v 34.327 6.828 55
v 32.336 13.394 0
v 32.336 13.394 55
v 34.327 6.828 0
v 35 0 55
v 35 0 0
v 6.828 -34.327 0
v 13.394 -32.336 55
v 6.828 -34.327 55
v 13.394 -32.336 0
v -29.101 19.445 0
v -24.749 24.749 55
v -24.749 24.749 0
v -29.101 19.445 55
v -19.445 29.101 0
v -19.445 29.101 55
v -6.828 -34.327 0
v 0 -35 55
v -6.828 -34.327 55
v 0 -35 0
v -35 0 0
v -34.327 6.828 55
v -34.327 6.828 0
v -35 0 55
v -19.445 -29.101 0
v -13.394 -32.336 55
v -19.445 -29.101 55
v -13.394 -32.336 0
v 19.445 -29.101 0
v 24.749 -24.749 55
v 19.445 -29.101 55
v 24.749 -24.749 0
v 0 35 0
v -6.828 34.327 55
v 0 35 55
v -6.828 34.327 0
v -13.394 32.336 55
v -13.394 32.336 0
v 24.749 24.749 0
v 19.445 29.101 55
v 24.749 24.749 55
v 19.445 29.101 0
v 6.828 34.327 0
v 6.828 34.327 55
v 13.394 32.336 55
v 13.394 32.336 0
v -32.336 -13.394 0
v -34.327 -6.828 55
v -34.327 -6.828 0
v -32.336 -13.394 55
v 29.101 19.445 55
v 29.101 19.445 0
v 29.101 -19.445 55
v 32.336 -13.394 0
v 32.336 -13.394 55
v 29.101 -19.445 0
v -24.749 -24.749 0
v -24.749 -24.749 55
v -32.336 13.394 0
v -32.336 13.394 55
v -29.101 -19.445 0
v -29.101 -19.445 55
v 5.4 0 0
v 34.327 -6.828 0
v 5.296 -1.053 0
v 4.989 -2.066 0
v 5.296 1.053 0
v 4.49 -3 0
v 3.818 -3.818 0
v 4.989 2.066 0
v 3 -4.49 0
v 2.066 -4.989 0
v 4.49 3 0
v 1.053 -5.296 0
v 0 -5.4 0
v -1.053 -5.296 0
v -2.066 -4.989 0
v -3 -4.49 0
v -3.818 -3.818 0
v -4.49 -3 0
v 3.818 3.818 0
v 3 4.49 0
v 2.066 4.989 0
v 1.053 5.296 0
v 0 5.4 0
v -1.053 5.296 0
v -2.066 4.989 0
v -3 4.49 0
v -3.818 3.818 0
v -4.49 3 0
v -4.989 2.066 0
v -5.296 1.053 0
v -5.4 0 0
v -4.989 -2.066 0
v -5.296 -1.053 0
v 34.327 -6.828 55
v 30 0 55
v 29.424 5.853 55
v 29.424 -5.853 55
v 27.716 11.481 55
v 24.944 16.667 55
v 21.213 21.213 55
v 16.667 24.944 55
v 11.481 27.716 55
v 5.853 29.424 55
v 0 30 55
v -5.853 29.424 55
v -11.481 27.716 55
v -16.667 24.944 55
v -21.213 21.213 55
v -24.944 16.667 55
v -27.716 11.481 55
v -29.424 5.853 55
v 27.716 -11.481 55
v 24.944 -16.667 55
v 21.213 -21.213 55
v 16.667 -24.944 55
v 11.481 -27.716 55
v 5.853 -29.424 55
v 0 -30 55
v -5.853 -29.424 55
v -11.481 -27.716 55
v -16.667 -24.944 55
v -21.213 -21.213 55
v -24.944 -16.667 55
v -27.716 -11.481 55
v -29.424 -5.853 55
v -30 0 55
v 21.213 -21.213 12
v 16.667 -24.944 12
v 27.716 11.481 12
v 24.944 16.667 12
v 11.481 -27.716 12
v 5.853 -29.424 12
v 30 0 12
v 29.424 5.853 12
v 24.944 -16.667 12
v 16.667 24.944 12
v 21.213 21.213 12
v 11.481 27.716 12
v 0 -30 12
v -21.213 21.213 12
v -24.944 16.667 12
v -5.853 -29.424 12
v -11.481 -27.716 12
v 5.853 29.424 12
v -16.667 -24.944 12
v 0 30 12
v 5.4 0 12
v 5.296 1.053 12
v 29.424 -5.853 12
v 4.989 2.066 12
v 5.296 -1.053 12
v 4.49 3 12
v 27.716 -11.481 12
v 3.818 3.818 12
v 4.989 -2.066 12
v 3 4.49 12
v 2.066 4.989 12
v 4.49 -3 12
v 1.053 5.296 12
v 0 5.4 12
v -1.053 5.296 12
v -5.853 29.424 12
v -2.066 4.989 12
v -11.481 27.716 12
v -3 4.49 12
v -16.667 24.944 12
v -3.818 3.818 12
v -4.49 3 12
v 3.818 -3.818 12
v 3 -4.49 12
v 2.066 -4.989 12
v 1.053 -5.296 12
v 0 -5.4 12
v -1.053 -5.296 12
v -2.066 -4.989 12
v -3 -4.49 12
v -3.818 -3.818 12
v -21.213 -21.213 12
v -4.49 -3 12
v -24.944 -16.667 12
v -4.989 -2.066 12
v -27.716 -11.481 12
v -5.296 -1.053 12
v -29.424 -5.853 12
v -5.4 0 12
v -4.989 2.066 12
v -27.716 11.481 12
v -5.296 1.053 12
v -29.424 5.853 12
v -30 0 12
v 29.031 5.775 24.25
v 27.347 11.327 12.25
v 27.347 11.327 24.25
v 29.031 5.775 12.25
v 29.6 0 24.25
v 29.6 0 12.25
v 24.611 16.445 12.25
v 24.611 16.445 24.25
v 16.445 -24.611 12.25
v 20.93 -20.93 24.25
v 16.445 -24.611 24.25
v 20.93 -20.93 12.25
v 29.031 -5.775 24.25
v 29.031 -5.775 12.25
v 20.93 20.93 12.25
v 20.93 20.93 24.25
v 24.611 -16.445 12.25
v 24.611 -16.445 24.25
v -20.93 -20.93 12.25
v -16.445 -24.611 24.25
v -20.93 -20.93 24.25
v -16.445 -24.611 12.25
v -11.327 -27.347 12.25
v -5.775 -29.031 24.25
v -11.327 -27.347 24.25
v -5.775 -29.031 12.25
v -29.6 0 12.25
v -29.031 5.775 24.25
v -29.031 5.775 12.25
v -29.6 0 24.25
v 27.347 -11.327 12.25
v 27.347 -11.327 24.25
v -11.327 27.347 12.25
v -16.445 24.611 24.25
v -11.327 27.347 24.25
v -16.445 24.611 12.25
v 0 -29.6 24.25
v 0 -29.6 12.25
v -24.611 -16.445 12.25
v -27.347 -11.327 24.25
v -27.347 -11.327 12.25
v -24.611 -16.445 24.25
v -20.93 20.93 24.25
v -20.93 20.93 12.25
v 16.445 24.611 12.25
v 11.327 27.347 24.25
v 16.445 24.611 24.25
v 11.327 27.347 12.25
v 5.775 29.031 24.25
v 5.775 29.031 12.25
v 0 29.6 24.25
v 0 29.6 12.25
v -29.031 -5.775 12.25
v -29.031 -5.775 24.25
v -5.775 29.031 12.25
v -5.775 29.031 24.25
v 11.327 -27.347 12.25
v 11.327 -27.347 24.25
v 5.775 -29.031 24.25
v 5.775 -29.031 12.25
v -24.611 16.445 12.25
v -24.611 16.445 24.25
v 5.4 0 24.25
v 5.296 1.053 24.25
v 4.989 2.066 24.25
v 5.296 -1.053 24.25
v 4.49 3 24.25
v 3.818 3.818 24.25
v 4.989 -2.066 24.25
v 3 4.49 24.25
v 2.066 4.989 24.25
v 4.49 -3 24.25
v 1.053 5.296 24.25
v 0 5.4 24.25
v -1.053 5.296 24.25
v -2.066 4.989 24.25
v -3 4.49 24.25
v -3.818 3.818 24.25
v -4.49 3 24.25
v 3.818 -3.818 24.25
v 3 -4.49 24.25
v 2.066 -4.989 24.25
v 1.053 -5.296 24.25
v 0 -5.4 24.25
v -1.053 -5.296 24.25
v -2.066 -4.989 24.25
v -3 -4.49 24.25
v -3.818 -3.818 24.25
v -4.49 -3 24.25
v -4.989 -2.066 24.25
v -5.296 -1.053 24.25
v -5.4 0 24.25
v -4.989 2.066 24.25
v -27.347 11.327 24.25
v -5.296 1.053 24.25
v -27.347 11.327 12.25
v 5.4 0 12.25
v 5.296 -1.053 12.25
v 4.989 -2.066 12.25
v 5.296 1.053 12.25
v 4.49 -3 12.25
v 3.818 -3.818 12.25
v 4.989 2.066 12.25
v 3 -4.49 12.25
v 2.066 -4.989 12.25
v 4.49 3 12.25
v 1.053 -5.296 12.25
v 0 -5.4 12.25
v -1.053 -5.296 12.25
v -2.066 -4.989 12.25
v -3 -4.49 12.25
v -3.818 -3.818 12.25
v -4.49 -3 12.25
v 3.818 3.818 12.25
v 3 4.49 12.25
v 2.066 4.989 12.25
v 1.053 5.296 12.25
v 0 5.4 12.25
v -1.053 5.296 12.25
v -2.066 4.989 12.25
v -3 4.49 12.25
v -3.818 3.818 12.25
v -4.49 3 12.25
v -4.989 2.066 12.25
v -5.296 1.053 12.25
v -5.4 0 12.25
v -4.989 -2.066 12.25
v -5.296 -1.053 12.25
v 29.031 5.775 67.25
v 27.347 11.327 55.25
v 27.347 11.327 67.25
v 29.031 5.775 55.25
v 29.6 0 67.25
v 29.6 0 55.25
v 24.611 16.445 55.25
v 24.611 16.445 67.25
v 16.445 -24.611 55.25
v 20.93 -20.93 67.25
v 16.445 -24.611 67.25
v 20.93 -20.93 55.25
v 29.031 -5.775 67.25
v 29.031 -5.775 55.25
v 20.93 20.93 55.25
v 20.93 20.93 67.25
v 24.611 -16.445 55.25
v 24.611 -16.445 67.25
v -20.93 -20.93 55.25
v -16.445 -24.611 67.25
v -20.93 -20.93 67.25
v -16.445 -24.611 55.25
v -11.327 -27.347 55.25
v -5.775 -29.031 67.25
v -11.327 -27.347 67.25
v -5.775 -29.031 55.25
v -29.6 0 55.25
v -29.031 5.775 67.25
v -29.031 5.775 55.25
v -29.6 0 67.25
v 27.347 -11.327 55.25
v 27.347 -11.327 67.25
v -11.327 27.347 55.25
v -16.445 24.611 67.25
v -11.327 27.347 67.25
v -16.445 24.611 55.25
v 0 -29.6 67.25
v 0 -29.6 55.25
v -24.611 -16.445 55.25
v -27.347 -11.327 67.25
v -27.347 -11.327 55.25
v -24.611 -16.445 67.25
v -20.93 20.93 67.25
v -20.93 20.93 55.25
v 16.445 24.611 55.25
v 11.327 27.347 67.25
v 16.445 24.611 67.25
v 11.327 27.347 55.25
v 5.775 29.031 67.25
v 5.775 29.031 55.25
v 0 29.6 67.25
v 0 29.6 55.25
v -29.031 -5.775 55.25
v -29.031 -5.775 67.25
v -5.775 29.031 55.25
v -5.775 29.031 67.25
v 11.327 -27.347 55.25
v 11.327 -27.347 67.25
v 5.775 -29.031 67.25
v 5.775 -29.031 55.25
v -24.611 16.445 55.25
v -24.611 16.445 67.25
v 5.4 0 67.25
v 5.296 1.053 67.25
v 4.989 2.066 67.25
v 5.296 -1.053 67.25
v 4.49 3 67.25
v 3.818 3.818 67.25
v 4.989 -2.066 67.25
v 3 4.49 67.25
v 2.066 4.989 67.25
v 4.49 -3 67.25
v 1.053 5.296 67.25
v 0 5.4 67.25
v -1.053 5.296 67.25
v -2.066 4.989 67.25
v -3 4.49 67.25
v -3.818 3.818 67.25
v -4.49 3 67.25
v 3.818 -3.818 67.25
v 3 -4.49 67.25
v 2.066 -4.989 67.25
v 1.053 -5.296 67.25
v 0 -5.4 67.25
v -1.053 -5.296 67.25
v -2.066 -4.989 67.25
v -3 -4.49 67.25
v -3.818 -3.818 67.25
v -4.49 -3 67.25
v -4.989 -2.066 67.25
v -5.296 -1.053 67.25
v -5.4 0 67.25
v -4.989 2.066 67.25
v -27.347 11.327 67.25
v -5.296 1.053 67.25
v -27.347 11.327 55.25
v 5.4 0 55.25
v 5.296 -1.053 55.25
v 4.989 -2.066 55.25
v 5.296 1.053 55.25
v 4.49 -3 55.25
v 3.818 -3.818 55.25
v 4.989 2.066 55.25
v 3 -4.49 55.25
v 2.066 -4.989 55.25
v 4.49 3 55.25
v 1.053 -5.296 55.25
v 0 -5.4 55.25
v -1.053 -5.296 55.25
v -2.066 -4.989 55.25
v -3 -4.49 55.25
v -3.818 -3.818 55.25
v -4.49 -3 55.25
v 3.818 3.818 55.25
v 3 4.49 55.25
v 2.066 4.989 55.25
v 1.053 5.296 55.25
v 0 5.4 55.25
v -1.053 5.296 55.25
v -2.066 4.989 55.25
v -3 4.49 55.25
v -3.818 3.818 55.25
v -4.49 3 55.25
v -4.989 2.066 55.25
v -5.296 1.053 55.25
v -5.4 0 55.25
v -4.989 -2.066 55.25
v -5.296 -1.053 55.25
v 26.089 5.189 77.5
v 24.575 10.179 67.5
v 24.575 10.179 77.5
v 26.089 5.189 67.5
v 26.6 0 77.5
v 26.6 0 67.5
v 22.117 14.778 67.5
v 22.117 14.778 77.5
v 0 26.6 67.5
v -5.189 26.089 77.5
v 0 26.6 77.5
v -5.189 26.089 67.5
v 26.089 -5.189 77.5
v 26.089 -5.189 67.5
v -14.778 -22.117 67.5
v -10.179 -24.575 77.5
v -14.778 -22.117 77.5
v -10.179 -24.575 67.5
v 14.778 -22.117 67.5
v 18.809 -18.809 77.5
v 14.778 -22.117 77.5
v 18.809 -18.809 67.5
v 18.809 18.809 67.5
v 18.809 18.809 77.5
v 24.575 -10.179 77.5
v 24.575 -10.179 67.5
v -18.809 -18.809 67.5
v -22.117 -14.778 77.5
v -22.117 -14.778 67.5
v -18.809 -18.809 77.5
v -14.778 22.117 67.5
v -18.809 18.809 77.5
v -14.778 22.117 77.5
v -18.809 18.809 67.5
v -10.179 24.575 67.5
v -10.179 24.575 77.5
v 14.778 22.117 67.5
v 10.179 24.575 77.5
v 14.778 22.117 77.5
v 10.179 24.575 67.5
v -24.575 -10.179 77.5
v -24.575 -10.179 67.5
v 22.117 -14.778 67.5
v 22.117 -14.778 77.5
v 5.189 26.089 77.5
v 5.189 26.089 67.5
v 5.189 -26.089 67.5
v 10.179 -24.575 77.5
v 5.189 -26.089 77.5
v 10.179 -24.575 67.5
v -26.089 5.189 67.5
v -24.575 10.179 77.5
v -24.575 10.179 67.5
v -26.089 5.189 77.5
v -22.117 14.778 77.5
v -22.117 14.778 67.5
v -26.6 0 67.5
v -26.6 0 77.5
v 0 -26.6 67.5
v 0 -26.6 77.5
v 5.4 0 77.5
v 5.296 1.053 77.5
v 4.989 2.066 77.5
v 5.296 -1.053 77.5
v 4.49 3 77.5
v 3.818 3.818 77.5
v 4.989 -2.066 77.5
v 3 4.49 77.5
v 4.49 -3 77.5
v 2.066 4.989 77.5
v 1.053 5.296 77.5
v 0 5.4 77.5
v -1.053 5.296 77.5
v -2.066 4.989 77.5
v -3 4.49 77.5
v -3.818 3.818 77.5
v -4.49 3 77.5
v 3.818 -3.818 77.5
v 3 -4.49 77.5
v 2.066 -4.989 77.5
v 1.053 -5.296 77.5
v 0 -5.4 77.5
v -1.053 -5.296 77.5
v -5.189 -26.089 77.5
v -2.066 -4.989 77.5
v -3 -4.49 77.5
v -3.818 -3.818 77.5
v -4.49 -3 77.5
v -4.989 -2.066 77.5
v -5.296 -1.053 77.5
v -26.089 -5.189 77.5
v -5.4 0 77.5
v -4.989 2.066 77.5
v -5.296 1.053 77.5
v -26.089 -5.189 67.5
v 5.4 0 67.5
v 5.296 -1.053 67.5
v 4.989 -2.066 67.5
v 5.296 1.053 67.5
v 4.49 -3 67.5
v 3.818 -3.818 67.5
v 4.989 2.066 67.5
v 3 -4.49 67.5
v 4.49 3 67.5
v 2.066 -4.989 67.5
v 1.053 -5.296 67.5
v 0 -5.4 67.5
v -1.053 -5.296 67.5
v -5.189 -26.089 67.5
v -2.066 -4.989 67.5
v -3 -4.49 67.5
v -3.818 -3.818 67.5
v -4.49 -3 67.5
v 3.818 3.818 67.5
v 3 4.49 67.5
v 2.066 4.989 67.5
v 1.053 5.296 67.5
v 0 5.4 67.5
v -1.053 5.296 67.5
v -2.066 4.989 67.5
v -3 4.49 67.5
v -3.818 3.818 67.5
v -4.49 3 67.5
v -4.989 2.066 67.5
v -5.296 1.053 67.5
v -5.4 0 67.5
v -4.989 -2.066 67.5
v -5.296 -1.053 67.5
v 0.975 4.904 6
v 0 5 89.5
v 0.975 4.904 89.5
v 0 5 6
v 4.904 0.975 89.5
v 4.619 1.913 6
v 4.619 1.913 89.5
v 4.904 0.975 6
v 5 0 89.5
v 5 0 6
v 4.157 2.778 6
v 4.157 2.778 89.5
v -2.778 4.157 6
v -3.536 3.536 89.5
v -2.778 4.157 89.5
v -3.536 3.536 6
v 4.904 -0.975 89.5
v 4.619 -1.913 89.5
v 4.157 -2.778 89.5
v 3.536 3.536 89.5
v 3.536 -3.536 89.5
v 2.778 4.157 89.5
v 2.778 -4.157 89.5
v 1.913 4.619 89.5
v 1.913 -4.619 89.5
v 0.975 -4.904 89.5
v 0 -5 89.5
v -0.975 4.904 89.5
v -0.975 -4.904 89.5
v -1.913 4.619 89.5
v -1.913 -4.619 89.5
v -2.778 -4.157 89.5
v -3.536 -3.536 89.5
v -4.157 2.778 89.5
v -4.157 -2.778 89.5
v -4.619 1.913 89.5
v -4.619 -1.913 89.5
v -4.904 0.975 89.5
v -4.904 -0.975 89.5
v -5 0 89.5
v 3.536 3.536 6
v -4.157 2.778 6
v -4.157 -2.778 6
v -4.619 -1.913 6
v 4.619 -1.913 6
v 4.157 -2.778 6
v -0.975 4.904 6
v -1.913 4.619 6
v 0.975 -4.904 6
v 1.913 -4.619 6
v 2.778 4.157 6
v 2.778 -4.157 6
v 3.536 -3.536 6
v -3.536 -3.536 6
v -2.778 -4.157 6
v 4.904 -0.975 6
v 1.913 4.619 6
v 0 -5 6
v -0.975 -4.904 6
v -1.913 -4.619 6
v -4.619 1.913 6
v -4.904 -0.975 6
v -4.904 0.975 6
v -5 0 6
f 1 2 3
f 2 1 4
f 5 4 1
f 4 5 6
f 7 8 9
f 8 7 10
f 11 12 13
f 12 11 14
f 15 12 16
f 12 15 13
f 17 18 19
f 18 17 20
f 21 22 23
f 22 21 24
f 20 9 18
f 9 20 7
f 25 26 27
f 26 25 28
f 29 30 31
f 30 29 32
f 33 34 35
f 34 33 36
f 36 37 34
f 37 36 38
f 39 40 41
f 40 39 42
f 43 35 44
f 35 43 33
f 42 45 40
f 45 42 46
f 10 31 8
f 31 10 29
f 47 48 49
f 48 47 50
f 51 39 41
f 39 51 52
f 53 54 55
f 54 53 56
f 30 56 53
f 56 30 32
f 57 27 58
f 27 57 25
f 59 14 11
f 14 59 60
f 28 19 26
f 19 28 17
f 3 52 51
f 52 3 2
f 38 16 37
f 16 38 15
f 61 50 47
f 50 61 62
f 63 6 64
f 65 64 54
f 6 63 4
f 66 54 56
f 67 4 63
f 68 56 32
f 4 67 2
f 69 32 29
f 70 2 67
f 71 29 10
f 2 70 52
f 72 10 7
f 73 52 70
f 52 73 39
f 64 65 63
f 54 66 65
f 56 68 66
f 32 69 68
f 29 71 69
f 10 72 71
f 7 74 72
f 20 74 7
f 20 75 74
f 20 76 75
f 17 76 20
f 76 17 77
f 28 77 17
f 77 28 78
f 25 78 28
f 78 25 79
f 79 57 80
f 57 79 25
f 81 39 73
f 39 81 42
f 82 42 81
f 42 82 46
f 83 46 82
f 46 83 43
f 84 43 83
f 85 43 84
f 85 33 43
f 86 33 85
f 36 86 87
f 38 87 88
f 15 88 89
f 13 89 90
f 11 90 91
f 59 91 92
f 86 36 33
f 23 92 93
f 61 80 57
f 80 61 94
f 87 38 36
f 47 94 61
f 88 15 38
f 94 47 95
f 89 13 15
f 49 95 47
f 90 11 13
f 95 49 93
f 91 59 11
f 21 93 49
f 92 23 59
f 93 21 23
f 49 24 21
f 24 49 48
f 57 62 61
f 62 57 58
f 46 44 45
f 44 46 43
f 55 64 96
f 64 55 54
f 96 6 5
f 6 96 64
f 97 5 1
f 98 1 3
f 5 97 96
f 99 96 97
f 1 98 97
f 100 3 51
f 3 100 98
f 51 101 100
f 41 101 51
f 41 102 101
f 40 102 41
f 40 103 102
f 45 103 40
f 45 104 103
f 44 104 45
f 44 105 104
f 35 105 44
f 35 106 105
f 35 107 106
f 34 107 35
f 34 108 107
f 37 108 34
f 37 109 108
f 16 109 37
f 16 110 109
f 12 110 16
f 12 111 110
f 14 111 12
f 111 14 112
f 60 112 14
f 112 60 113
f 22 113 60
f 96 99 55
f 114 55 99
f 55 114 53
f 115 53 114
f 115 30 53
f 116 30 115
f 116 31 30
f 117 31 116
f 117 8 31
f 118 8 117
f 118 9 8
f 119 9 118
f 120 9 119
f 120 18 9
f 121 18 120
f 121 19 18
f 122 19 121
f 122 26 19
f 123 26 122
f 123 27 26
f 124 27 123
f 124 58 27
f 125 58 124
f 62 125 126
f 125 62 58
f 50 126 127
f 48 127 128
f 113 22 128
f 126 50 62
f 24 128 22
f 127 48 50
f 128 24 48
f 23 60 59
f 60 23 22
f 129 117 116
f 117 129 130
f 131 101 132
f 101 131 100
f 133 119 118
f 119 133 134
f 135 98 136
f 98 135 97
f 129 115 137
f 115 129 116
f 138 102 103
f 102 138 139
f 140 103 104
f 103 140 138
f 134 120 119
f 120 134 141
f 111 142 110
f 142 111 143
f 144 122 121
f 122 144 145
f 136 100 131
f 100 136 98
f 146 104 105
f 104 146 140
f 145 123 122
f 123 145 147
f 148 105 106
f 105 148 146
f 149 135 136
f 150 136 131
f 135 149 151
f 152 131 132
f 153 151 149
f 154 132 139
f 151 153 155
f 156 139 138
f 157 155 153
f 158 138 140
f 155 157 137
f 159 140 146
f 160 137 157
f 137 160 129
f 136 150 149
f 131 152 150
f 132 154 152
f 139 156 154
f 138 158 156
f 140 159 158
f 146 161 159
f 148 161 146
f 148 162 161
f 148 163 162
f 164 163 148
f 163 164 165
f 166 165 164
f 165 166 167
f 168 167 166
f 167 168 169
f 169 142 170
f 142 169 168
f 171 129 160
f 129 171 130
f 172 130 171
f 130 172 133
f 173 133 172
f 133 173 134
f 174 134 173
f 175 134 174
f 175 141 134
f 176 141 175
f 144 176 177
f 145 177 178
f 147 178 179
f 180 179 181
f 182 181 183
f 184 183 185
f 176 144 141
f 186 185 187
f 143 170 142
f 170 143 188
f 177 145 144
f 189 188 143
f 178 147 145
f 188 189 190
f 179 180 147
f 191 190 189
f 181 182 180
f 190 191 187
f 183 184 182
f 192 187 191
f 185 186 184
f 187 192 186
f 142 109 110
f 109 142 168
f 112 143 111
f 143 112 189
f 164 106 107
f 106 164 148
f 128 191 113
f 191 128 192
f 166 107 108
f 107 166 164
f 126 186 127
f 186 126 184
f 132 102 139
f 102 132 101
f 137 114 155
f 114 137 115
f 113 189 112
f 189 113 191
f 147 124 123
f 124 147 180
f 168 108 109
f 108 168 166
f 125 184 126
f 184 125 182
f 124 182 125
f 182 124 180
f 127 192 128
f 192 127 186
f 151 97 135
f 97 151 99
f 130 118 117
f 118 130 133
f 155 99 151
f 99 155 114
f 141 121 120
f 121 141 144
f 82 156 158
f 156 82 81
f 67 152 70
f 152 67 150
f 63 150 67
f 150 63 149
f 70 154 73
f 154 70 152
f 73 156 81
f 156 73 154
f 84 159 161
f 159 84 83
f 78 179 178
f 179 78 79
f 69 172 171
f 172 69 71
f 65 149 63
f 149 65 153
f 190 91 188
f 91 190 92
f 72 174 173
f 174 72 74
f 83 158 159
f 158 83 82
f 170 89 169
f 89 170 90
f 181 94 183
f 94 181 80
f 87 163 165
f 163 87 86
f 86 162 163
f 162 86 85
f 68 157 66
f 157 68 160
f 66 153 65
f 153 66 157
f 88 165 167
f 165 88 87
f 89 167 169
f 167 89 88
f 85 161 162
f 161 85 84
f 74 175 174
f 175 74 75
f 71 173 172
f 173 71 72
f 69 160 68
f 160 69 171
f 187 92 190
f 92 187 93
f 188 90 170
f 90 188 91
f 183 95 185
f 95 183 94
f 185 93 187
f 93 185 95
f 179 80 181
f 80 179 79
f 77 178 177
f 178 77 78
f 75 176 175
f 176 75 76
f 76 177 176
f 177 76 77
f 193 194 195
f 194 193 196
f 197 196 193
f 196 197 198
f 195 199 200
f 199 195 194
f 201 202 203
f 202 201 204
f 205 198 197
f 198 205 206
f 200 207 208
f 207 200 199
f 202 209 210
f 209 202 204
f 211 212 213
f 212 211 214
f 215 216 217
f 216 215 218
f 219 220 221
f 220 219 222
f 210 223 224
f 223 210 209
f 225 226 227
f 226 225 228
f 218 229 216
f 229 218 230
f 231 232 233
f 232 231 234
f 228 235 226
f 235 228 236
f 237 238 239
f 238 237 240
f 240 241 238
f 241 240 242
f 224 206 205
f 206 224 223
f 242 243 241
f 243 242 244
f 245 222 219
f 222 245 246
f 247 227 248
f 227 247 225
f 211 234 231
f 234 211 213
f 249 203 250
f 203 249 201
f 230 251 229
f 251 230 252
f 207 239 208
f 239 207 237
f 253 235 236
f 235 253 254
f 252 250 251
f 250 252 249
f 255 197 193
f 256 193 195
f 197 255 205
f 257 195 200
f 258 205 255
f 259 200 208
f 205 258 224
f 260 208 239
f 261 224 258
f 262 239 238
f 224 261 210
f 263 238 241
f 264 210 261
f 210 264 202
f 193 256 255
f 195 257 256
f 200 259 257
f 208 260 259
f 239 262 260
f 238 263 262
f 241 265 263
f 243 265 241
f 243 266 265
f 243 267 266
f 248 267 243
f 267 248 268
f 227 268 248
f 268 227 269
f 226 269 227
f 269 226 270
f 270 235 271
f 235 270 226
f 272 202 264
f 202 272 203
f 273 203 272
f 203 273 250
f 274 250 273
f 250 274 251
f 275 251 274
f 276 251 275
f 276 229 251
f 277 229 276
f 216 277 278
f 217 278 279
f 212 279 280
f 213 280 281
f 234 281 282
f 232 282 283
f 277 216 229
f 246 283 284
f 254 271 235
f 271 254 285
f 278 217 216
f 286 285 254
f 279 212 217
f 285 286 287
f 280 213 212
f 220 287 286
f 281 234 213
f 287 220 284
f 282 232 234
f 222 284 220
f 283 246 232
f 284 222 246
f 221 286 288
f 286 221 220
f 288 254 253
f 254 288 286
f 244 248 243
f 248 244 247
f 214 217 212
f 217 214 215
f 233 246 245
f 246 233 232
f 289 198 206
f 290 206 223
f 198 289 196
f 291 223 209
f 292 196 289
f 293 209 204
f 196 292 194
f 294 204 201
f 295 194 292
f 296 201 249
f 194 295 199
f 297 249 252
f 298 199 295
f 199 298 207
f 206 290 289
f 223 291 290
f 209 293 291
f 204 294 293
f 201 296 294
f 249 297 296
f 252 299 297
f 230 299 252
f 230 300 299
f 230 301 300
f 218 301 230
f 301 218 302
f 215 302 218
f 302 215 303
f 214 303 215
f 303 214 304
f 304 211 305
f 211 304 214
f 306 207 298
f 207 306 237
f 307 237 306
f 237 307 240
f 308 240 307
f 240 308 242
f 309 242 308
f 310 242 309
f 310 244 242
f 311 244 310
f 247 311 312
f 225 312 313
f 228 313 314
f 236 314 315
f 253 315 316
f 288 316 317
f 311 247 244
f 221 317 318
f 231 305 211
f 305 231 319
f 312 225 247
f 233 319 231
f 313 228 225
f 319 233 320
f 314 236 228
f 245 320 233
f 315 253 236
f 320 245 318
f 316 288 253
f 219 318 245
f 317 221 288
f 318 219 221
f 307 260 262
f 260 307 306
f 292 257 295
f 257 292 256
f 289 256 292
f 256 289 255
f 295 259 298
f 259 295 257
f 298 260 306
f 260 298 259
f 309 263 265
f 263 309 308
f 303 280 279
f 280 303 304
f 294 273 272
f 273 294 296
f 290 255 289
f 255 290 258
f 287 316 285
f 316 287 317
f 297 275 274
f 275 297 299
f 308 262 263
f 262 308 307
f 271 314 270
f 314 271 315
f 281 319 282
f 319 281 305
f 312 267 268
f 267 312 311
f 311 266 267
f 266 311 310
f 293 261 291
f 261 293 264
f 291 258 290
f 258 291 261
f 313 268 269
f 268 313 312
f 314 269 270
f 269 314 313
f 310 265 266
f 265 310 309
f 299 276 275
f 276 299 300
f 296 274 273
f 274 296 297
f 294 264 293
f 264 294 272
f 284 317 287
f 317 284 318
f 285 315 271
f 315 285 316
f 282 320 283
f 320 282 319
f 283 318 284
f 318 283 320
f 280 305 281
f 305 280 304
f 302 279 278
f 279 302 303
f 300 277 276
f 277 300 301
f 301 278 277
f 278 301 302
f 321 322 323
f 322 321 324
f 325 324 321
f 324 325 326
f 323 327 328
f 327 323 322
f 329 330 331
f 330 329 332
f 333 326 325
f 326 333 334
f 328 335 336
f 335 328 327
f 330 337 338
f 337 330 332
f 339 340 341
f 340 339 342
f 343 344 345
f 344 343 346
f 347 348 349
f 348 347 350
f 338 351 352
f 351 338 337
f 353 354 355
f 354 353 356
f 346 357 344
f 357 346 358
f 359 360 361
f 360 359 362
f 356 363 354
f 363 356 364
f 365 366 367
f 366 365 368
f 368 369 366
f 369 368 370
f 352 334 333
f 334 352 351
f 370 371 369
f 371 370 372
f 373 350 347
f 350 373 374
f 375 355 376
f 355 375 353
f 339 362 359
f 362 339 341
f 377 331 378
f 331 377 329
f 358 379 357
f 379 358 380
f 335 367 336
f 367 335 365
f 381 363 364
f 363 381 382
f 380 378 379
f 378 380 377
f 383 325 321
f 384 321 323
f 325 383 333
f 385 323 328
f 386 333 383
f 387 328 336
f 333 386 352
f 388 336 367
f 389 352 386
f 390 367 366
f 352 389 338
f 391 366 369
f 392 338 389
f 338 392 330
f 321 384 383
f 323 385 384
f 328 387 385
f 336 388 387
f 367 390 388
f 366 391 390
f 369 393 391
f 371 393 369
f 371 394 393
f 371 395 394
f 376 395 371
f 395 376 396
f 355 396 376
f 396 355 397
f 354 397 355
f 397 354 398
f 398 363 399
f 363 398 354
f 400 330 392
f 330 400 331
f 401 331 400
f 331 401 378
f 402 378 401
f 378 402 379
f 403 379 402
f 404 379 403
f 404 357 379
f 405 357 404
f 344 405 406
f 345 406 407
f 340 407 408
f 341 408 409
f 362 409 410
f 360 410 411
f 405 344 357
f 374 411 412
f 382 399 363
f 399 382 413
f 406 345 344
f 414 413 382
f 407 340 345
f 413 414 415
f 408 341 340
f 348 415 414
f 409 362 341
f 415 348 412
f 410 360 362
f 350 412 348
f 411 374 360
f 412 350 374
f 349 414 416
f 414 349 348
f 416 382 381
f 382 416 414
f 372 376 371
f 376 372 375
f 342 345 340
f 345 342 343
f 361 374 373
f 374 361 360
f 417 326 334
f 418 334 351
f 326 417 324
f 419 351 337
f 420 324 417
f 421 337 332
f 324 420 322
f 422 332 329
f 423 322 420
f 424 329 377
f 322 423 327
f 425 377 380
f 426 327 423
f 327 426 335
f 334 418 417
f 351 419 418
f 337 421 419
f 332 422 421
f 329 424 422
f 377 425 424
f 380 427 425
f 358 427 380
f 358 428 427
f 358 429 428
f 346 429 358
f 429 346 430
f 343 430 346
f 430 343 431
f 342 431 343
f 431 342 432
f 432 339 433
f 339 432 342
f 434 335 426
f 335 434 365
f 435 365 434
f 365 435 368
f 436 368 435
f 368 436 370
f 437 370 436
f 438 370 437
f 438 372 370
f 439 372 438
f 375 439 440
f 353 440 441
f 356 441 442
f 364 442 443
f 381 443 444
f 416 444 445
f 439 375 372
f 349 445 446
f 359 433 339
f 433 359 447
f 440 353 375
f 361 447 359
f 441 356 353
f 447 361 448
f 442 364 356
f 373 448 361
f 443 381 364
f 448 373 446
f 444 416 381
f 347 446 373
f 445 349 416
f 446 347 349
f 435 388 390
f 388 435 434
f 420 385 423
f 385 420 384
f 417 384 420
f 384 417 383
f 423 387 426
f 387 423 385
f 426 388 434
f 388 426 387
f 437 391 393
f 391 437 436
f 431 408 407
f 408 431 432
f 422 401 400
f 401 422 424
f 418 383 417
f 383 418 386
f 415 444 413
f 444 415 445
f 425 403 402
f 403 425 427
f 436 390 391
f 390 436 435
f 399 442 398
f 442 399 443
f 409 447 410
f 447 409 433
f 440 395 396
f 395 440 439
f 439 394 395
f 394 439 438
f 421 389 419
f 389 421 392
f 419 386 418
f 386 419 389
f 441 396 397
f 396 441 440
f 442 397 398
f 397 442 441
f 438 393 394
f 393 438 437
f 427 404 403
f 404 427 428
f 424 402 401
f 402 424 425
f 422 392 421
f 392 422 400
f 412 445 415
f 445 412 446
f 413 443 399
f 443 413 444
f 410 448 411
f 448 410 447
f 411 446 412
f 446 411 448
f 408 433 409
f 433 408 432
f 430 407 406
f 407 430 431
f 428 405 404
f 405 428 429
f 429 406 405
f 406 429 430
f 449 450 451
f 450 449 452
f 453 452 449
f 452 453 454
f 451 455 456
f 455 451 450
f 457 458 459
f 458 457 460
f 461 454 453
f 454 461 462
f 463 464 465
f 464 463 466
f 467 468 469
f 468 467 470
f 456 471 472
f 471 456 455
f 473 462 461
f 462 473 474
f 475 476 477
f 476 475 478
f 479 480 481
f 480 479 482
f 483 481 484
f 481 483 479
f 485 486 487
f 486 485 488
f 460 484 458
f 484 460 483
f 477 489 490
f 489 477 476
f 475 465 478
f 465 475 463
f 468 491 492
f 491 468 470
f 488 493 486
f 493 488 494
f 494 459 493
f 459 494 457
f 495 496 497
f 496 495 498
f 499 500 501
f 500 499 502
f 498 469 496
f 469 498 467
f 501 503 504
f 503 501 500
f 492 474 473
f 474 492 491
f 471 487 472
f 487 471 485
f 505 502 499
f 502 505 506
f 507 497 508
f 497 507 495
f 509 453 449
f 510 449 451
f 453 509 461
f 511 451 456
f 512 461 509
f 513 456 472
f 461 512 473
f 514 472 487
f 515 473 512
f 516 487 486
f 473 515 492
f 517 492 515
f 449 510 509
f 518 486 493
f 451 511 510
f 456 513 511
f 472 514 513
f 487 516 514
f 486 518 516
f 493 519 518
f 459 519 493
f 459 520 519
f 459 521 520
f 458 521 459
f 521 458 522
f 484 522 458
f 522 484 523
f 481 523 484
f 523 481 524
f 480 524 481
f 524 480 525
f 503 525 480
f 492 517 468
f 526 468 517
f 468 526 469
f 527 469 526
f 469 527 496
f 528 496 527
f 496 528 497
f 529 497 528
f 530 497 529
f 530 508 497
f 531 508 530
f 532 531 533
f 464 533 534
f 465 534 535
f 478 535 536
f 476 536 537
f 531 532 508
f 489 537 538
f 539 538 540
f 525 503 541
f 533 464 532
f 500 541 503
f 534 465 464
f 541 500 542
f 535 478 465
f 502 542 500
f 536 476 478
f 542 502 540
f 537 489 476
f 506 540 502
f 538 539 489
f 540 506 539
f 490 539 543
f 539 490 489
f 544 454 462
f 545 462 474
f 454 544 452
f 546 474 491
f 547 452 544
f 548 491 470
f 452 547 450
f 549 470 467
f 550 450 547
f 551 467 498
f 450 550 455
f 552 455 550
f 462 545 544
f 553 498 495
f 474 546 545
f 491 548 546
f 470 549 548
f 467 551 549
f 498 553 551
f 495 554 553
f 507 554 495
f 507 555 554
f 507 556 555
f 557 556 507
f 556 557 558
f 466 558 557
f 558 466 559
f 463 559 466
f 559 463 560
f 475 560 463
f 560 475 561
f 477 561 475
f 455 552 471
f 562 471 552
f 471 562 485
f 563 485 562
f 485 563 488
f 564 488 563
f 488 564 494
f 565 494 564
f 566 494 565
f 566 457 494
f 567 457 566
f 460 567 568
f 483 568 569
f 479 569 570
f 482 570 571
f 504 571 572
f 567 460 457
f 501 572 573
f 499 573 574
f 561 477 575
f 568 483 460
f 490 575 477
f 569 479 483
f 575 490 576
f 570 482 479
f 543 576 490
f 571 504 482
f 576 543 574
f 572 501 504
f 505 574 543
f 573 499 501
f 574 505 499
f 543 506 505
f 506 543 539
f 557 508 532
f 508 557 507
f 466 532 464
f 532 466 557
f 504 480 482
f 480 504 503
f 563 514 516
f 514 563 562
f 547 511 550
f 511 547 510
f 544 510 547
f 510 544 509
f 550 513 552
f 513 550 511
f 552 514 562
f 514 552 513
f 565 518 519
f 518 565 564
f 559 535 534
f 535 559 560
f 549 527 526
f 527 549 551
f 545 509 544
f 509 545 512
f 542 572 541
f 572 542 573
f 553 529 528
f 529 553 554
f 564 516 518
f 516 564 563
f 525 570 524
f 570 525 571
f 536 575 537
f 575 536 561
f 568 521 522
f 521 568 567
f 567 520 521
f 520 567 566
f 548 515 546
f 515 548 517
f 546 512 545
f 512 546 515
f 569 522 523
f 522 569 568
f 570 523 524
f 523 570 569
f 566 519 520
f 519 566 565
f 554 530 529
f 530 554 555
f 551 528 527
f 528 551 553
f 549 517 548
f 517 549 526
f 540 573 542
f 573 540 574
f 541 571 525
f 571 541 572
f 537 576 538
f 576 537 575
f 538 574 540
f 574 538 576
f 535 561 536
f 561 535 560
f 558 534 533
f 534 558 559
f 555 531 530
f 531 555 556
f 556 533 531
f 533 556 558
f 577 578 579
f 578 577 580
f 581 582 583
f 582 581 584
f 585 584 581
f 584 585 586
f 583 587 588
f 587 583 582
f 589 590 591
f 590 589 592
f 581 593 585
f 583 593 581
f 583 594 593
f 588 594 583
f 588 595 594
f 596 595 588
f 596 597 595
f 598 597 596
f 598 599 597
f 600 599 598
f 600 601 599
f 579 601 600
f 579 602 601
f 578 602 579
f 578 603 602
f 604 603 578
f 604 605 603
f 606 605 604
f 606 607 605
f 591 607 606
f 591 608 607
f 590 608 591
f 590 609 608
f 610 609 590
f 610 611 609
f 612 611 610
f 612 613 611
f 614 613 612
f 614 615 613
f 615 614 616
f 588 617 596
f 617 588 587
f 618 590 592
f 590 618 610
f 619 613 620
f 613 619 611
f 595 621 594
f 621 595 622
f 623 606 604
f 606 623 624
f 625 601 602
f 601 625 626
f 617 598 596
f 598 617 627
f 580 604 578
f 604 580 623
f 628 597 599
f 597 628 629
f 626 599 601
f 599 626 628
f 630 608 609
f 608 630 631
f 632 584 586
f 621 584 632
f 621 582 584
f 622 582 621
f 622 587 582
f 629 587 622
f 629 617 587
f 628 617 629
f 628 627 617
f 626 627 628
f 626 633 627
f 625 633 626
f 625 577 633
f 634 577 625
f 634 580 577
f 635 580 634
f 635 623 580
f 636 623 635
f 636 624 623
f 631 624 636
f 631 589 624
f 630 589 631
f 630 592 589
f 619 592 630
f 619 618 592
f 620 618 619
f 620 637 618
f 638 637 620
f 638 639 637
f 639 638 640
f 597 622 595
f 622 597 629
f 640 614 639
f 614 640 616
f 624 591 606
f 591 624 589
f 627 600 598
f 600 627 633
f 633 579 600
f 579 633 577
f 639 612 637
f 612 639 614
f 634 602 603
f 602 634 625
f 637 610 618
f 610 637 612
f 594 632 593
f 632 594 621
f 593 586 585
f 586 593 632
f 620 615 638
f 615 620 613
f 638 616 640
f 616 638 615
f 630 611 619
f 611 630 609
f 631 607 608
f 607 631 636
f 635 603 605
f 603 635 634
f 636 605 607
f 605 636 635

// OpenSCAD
$fn = 32;

// ------------------------------------------------------------------------
// Bearing housing: housing d70, two bearings and a shaft
// Every part is its own module, assembly() places them once.
// ------------------------------------------------------------------------

// --- part 1 ---
module housing() {
  difference() {
    cylinder(h = 55, d = 70);
    translate([0, 0, 12]) cylinder(h = 44, d = 60);
    translate([0, 0, -1]) cylinder(h = 14, d = 10.8);
  }
}

// --- part 2 ---
module bearing_lower() {
  difference() {
      translate([0, 0, 0]) cylinder(h = 12, d = 59.2);
      translate([0, 0, -1]) cylinder(h = 14, d = 10.8);
    }
}

// --- part 3 ---
module bearing_upper() {
  difference() {
      translate([0, 0, 0]) cylinder(h = 12, d = 59.2);
      translate([0, 0, -1]) cylinder(h = 14, d = 10.8);
    }
}

// --- part 4 ---
module spacer() {
  difference() {
      translate([0, 0, 0]) cylinder(h = 10, d = 53.2);
      translate([0, 0, -1]) cylinder(h = 12, d = 10.8);
    }
}

// --- part 5 ---
module shaft() {
  translate([0, 0, -41.75]) cylinder(h = 83.5, d = 10);
}

// --- assembly ---
module assembly() {
  translate([0, 0, 0]) rotate([0, 0, 0]) housing();
  translate([0, 0, 12.25]) rotate([0, 0, 0]) bearing_lower();
  translate([0, 0, 55.25]) rotate([0, 0, 0]) bearing_upper();
  translate([0, 0, 67.5]) rotate([0, 0, 0]) spacer();
  translate([0, 0, 47.75]) rotate([0, 0, 0]) shaft();
}

assembly();
